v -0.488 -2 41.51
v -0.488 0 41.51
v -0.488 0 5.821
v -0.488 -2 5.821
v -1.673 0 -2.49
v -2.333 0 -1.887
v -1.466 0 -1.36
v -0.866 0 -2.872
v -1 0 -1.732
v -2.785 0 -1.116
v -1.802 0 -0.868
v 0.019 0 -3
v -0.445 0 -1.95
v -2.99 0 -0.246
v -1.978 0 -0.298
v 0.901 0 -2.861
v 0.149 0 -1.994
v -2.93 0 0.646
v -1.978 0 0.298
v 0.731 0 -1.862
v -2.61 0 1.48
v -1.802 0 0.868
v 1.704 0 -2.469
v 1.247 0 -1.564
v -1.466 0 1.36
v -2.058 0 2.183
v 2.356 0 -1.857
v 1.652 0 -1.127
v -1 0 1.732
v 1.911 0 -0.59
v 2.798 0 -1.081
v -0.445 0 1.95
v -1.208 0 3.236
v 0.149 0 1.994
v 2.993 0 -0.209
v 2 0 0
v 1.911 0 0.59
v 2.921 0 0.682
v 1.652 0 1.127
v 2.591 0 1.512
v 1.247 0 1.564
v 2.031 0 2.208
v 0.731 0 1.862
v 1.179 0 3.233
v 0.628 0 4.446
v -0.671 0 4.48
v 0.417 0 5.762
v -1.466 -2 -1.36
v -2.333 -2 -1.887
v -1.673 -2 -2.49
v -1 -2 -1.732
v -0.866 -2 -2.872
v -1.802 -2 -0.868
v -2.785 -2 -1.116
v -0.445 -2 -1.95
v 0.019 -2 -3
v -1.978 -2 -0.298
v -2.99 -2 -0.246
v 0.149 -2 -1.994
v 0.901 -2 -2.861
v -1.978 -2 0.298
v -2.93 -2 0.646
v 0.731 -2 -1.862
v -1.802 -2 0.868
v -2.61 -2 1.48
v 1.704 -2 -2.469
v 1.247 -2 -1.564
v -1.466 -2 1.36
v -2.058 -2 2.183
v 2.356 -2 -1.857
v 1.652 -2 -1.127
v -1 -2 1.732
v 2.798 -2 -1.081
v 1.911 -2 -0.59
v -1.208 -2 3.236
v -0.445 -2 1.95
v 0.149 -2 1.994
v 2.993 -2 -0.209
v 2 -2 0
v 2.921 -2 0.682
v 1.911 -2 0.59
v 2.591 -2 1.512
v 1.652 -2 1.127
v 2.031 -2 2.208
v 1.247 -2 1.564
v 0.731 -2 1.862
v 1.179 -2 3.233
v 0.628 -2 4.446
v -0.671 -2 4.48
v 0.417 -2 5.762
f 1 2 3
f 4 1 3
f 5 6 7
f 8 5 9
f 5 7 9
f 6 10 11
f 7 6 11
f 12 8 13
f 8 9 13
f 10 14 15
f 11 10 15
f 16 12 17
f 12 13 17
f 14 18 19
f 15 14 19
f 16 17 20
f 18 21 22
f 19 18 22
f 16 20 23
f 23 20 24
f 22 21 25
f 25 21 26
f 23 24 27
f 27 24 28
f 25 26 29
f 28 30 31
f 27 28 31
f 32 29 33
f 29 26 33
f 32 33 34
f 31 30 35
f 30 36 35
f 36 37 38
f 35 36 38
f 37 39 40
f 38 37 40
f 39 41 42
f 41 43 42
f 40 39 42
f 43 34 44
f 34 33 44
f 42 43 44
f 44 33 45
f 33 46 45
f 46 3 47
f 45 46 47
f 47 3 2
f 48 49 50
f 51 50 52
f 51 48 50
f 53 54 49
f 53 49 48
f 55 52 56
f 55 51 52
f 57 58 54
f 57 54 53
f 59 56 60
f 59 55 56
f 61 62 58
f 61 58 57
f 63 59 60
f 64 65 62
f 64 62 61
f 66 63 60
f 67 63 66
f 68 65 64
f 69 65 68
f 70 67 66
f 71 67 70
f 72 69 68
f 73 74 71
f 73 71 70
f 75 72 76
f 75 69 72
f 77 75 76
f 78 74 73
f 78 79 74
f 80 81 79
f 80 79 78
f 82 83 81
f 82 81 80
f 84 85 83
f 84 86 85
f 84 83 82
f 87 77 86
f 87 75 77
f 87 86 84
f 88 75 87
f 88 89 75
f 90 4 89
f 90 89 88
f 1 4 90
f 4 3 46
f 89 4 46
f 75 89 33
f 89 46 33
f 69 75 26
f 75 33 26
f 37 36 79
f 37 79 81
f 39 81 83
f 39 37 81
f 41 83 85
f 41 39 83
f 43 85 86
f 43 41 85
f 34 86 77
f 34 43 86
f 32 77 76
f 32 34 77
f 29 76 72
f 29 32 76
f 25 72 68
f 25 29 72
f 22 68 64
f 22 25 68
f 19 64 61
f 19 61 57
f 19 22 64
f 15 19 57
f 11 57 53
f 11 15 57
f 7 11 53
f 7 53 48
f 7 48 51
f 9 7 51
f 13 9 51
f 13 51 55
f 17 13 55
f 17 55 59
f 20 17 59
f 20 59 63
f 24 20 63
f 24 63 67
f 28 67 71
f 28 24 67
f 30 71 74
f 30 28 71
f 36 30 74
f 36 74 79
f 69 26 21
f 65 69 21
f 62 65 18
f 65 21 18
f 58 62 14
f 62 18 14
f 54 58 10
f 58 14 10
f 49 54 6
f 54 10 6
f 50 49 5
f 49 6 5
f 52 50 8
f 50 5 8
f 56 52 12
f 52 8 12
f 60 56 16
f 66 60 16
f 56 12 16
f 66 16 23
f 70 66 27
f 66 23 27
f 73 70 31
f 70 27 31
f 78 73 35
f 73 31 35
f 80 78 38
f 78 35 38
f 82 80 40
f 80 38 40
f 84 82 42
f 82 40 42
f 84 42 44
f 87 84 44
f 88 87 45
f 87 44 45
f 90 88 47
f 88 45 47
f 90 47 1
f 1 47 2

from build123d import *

# Parameters (mm, degrees)
F0_R     = 2
F1_DEPTH = 2


with BuildPart() as f1:
    # F0 (on Front) → F1 (new body)
    with BuildSketch(Plane.XZ):
        with BuildLine():
            ThreePointArc((-0.487867, 5.820938), (-0.897138, 3.839724), (-2.05795, 2.182852))
            ThreePointArc((-2.05795, 2.182852), (0.018579, -2.999942), (2.030755, 2.208174))
            ThreePointArc((2.030755, 2.208174), (0.86277, 3.821091), (0.416949, 5.76195))
            Line((0.416949, 5.76195), (-0.487867, 41.509971))
            Line((-0.487867, 41.509971), (-0.487867, 5.820938))
        make_face()
        Circle(F0_R, mode=Mode.SUBTRACT)
    extrude(amount=F1_DEPTH)


solid = f1.part
